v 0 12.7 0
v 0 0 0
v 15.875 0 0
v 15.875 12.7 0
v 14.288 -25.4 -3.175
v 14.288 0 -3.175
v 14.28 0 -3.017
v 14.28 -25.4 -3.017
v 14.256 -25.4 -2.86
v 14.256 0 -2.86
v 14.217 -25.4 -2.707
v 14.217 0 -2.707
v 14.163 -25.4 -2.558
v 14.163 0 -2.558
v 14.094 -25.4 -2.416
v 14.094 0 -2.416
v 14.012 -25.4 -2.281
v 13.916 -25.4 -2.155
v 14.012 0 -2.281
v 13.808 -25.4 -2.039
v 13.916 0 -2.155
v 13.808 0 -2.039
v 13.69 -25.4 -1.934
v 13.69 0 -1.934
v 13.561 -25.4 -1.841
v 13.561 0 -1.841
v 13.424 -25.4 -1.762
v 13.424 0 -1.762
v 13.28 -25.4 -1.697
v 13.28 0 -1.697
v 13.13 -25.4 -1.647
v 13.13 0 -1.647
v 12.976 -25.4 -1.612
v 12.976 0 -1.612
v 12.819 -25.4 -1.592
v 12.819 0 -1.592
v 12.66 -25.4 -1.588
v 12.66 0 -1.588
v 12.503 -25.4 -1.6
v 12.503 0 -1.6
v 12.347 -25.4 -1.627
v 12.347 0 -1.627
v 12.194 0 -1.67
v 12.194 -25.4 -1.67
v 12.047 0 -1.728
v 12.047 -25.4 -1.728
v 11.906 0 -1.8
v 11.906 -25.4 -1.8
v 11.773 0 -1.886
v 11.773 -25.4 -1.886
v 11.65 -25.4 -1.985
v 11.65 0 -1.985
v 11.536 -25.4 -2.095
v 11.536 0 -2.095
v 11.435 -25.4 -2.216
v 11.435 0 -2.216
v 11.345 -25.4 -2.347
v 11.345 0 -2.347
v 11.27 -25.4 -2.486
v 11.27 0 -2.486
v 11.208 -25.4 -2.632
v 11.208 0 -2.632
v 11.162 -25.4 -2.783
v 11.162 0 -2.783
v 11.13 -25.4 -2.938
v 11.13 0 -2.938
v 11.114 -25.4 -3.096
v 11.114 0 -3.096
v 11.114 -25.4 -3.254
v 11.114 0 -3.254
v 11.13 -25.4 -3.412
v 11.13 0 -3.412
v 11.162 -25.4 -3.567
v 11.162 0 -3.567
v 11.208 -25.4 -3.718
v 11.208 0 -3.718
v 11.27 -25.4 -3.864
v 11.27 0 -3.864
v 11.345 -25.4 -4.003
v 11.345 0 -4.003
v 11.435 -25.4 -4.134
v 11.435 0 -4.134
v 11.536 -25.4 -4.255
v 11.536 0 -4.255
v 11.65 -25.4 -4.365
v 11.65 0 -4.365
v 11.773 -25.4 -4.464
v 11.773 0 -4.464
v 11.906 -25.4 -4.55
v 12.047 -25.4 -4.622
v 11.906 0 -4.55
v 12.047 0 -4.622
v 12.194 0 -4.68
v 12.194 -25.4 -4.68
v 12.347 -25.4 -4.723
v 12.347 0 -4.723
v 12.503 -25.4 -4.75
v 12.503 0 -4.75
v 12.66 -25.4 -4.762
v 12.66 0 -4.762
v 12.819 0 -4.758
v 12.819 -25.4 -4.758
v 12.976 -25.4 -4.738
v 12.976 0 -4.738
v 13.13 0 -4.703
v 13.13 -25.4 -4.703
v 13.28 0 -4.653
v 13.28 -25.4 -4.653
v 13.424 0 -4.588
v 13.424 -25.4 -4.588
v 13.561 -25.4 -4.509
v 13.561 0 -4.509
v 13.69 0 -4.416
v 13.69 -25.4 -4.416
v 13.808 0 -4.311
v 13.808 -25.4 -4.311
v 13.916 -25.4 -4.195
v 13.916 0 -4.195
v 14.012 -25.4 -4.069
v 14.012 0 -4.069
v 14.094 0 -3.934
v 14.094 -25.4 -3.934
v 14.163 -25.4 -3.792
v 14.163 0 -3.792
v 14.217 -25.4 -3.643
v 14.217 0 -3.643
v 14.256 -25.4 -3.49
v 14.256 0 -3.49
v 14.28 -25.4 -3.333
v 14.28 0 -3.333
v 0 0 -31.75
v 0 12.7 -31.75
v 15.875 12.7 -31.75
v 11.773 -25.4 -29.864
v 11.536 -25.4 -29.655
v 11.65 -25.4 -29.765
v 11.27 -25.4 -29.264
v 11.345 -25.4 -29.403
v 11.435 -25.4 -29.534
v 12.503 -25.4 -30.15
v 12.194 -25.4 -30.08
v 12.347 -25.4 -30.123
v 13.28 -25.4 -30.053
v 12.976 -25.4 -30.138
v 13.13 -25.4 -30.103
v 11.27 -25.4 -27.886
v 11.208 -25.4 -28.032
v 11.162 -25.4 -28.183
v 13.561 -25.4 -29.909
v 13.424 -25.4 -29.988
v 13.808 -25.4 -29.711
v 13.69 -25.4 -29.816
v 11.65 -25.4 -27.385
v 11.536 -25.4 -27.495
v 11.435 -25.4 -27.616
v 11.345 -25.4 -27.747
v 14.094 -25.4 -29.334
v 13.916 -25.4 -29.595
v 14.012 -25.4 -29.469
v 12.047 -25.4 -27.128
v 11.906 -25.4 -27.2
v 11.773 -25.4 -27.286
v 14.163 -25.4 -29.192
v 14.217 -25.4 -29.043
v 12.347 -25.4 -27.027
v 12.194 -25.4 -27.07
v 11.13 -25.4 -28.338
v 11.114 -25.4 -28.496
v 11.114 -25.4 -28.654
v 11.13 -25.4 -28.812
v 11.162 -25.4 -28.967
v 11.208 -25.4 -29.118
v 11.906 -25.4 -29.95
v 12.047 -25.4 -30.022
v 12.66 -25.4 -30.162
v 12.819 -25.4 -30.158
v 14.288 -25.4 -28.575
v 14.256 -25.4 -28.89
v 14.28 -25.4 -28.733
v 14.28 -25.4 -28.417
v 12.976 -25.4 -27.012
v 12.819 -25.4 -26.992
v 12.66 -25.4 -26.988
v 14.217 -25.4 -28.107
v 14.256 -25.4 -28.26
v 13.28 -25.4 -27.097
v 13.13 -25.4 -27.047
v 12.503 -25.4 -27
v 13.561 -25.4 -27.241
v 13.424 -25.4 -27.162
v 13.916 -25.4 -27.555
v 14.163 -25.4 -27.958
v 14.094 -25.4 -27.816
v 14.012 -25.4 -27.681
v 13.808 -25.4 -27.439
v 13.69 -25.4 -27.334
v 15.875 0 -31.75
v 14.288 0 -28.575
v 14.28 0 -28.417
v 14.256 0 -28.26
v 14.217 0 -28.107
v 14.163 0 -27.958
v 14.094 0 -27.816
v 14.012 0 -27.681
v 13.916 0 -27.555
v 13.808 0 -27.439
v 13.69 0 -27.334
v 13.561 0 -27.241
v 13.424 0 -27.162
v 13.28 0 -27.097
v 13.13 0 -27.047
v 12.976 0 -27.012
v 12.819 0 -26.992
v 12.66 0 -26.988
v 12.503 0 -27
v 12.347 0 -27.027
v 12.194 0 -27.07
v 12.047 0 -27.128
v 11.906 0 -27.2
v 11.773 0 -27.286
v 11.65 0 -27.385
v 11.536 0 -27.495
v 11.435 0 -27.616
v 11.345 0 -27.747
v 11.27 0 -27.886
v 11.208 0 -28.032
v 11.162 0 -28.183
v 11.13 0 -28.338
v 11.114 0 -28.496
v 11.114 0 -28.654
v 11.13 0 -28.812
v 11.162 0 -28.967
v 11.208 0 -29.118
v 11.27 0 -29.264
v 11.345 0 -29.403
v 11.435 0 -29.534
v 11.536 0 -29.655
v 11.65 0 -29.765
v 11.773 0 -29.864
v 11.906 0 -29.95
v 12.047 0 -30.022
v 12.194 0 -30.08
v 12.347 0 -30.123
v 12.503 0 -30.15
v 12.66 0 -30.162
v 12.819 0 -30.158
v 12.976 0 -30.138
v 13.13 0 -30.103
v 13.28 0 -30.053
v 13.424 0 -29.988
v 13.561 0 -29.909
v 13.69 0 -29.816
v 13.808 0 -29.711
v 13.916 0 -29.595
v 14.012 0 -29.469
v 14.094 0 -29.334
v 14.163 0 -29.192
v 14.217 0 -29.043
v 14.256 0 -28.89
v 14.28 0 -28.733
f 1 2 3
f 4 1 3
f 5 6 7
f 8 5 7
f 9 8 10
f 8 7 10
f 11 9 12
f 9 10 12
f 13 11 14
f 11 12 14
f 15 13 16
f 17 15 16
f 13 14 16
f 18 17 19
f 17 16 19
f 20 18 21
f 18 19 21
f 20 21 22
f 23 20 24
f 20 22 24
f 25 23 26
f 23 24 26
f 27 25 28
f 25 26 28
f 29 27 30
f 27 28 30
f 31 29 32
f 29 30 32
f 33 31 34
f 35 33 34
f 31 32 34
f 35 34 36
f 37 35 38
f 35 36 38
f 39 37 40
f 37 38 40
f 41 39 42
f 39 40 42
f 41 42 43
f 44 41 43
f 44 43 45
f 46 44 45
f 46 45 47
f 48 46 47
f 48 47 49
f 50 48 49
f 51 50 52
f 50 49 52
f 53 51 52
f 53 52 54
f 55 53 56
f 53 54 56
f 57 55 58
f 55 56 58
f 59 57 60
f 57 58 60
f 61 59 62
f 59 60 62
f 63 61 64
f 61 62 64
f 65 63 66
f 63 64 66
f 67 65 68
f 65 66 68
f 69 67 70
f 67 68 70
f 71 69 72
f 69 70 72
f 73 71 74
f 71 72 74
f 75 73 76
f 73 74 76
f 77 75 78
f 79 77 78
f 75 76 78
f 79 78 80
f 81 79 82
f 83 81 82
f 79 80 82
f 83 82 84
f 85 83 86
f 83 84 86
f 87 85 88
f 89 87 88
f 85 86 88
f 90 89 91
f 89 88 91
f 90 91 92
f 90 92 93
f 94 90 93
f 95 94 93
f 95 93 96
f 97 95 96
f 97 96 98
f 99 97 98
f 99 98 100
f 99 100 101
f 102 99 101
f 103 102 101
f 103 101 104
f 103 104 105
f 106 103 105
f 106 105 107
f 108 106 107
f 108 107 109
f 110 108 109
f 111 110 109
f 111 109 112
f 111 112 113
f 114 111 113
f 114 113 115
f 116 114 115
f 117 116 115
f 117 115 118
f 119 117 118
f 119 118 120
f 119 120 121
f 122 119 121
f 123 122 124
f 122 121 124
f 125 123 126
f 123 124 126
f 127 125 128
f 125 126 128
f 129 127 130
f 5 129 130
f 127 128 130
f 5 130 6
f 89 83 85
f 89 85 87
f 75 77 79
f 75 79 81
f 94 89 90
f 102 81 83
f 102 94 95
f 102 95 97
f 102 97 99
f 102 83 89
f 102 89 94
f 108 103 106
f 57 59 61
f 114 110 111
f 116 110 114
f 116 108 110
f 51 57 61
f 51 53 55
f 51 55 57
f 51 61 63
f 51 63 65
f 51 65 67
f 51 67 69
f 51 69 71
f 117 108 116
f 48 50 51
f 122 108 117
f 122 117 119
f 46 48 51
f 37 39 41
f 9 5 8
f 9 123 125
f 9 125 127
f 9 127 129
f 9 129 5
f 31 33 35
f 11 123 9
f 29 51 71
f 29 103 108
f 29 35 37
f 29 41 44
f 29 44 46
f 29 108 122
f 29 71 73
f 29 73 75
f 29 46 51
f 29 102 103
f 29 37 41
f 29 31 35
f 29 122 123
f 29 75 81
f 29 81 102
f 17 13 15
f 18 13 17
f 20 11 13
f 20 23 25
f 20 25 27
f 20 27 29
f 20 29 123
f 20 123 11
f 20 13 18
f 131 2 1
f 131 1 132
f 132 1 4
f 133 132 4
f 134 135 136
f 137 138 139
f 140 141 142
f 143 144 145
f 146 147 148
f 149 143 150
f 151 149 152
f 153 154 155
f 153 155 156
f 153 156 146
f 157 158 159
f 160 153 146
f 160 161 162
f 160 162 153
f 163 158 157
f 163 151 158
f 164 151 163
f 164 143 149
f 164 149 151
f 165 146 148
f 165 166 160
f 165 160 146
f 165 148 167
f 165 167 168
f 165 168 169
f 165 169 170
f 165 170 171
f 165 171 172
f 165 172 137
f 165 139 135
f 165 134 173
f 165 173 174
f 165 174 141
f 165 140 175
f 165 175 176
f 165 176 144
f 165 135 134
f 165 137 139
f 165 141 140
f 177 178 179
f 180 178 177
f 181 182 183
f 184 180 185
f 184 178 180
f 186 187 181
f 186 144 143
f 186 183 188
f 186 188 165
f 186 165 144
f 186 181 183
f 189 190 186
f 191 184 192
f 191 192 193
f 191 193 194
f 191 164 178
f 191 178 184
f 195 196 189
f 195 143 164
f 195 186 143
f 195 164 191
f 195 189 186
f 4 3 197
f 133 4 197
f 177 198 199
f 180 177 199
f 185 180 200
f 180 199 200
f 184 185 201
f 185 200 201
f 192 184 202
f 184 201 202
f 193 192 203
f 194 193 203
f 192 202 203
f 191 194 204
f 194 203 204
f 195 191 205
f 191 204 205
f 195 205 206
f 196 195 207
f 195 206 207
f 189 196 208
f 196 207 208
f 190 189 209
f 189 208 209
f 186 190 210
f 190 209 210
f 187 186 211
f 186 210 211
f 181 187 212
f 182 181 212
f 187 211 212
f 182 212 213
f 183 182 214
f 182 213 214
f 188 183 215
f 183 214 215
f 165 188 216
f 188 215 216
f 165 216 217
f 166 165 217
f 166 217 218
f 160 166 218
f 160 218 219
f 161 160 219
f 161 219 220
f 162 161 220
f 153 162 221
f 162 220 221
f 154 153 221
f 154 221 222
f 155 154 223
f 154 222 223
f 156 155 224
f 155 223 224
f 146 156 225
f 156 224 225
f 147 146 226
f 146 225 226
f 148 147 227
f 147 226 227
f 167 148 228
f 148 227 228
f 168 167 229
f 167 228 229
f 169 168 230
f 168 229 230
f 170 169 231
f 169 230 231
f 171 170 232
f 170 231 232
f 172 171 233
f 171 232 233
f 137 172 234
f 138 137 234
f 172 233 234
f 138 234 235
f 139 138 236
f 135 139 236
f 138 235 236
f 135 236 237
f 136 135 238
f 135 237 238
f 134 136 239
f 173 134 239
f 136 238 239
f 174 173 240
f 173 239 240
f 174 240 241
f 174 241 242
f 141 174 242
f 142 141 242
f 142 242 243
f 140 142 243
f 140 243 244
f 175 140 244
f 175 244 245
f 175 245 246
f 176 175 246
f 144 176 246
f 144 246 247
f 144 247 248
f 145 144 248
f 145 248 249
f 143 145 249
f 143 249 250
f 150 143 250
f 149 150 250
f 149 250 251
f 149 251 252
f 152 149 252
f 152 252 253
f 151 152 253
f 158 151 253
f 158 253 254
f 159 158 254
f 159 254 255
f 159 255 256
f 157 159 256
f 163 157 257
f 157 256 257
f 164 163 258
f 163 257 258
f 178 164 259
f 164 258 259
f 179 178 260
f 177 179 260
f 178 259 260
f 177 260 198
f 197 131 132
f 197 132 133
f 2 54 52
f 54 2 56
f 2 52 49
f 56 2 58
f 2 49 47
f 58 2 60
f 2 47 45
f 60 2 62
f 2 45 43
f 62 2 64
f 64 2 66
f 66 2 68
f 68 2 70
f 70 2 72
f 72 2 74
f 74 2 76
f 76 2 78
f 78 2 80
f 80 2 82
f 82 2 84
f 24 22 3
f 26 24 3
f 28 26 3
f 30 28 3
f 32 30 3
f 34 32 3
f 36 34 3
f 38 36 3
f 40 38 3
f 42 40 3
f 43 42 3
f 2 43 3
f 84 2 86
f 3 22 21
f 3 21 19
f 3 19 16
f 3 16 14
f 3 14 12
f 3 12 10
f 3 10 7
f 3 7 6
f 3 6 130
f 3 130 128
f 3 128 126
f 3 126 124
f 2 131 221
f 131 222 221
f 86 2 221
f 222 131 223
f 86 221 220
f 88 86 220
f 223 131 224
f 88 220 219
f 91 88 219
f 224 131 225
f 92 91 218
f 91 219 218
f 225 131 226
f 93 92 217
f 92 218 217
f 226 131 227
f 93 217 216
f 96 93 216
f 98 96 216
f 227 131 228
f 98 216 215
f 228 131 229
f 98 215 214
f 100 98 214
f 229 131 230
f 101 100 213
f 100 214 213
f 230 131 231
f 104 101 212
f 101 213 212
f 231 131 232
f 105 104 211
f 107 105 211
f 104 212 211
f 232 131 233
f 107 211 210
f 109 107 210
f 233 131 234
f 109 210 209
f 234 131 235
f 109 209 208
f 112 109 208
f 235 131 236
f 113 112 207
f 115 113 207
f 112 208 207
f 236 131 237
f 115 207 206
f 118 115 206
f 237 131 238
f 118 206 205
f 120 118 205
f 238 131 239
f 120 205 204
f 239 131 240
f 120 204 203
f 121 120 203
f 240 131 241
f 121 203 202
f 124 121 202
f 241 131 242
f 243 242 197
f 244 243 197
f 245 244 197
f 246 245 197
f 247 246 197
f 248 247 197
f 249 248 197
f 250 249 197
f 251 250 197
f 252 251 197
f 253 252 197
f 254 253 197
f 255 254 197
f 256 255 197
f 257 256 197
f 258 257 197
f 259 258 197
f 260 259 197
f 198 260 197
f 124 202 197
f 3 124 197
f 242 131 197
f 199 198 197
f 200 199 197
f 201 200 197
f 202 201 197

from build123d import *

# Parameters (mm, degrees)
SKETCH1_W           = 15.875
SKETCH1_H           = 31.75
BOSS_EXTRUDE1_DEPTH = 12.7
SKETCH2_R           = 1.5875
BOSS_EXTRUDE2_DEPTH = 25.4


with BuildPart() as part:
    # Sketch1 → Boss-Extrude1 (new body)
    with BuildSketch(Plane(origin=(0, 0, 0), x_dir=(1, 0, 0), z_dir=(0, 1, 0))):
        with Locations((7.9375, 15.875)):
            Rectangle(SKETCH1_W, SKETCH1_H)
    extrude(amount=BOSS_EXTRUDE1_DEPTH)

    # Sketch2 → Boss-Extrude2 (add)
    with BuildSketch(Plane.XZ):
        with Locations((12.7, -3.175)):
            Circle(SKETCH2_R)
        with Locations((12.7, -28.575)):
            Circle(SKETCH2_R)
    extrude(amount=BOSS_EXTRUDE2_DEPTH)


solid = part.part
